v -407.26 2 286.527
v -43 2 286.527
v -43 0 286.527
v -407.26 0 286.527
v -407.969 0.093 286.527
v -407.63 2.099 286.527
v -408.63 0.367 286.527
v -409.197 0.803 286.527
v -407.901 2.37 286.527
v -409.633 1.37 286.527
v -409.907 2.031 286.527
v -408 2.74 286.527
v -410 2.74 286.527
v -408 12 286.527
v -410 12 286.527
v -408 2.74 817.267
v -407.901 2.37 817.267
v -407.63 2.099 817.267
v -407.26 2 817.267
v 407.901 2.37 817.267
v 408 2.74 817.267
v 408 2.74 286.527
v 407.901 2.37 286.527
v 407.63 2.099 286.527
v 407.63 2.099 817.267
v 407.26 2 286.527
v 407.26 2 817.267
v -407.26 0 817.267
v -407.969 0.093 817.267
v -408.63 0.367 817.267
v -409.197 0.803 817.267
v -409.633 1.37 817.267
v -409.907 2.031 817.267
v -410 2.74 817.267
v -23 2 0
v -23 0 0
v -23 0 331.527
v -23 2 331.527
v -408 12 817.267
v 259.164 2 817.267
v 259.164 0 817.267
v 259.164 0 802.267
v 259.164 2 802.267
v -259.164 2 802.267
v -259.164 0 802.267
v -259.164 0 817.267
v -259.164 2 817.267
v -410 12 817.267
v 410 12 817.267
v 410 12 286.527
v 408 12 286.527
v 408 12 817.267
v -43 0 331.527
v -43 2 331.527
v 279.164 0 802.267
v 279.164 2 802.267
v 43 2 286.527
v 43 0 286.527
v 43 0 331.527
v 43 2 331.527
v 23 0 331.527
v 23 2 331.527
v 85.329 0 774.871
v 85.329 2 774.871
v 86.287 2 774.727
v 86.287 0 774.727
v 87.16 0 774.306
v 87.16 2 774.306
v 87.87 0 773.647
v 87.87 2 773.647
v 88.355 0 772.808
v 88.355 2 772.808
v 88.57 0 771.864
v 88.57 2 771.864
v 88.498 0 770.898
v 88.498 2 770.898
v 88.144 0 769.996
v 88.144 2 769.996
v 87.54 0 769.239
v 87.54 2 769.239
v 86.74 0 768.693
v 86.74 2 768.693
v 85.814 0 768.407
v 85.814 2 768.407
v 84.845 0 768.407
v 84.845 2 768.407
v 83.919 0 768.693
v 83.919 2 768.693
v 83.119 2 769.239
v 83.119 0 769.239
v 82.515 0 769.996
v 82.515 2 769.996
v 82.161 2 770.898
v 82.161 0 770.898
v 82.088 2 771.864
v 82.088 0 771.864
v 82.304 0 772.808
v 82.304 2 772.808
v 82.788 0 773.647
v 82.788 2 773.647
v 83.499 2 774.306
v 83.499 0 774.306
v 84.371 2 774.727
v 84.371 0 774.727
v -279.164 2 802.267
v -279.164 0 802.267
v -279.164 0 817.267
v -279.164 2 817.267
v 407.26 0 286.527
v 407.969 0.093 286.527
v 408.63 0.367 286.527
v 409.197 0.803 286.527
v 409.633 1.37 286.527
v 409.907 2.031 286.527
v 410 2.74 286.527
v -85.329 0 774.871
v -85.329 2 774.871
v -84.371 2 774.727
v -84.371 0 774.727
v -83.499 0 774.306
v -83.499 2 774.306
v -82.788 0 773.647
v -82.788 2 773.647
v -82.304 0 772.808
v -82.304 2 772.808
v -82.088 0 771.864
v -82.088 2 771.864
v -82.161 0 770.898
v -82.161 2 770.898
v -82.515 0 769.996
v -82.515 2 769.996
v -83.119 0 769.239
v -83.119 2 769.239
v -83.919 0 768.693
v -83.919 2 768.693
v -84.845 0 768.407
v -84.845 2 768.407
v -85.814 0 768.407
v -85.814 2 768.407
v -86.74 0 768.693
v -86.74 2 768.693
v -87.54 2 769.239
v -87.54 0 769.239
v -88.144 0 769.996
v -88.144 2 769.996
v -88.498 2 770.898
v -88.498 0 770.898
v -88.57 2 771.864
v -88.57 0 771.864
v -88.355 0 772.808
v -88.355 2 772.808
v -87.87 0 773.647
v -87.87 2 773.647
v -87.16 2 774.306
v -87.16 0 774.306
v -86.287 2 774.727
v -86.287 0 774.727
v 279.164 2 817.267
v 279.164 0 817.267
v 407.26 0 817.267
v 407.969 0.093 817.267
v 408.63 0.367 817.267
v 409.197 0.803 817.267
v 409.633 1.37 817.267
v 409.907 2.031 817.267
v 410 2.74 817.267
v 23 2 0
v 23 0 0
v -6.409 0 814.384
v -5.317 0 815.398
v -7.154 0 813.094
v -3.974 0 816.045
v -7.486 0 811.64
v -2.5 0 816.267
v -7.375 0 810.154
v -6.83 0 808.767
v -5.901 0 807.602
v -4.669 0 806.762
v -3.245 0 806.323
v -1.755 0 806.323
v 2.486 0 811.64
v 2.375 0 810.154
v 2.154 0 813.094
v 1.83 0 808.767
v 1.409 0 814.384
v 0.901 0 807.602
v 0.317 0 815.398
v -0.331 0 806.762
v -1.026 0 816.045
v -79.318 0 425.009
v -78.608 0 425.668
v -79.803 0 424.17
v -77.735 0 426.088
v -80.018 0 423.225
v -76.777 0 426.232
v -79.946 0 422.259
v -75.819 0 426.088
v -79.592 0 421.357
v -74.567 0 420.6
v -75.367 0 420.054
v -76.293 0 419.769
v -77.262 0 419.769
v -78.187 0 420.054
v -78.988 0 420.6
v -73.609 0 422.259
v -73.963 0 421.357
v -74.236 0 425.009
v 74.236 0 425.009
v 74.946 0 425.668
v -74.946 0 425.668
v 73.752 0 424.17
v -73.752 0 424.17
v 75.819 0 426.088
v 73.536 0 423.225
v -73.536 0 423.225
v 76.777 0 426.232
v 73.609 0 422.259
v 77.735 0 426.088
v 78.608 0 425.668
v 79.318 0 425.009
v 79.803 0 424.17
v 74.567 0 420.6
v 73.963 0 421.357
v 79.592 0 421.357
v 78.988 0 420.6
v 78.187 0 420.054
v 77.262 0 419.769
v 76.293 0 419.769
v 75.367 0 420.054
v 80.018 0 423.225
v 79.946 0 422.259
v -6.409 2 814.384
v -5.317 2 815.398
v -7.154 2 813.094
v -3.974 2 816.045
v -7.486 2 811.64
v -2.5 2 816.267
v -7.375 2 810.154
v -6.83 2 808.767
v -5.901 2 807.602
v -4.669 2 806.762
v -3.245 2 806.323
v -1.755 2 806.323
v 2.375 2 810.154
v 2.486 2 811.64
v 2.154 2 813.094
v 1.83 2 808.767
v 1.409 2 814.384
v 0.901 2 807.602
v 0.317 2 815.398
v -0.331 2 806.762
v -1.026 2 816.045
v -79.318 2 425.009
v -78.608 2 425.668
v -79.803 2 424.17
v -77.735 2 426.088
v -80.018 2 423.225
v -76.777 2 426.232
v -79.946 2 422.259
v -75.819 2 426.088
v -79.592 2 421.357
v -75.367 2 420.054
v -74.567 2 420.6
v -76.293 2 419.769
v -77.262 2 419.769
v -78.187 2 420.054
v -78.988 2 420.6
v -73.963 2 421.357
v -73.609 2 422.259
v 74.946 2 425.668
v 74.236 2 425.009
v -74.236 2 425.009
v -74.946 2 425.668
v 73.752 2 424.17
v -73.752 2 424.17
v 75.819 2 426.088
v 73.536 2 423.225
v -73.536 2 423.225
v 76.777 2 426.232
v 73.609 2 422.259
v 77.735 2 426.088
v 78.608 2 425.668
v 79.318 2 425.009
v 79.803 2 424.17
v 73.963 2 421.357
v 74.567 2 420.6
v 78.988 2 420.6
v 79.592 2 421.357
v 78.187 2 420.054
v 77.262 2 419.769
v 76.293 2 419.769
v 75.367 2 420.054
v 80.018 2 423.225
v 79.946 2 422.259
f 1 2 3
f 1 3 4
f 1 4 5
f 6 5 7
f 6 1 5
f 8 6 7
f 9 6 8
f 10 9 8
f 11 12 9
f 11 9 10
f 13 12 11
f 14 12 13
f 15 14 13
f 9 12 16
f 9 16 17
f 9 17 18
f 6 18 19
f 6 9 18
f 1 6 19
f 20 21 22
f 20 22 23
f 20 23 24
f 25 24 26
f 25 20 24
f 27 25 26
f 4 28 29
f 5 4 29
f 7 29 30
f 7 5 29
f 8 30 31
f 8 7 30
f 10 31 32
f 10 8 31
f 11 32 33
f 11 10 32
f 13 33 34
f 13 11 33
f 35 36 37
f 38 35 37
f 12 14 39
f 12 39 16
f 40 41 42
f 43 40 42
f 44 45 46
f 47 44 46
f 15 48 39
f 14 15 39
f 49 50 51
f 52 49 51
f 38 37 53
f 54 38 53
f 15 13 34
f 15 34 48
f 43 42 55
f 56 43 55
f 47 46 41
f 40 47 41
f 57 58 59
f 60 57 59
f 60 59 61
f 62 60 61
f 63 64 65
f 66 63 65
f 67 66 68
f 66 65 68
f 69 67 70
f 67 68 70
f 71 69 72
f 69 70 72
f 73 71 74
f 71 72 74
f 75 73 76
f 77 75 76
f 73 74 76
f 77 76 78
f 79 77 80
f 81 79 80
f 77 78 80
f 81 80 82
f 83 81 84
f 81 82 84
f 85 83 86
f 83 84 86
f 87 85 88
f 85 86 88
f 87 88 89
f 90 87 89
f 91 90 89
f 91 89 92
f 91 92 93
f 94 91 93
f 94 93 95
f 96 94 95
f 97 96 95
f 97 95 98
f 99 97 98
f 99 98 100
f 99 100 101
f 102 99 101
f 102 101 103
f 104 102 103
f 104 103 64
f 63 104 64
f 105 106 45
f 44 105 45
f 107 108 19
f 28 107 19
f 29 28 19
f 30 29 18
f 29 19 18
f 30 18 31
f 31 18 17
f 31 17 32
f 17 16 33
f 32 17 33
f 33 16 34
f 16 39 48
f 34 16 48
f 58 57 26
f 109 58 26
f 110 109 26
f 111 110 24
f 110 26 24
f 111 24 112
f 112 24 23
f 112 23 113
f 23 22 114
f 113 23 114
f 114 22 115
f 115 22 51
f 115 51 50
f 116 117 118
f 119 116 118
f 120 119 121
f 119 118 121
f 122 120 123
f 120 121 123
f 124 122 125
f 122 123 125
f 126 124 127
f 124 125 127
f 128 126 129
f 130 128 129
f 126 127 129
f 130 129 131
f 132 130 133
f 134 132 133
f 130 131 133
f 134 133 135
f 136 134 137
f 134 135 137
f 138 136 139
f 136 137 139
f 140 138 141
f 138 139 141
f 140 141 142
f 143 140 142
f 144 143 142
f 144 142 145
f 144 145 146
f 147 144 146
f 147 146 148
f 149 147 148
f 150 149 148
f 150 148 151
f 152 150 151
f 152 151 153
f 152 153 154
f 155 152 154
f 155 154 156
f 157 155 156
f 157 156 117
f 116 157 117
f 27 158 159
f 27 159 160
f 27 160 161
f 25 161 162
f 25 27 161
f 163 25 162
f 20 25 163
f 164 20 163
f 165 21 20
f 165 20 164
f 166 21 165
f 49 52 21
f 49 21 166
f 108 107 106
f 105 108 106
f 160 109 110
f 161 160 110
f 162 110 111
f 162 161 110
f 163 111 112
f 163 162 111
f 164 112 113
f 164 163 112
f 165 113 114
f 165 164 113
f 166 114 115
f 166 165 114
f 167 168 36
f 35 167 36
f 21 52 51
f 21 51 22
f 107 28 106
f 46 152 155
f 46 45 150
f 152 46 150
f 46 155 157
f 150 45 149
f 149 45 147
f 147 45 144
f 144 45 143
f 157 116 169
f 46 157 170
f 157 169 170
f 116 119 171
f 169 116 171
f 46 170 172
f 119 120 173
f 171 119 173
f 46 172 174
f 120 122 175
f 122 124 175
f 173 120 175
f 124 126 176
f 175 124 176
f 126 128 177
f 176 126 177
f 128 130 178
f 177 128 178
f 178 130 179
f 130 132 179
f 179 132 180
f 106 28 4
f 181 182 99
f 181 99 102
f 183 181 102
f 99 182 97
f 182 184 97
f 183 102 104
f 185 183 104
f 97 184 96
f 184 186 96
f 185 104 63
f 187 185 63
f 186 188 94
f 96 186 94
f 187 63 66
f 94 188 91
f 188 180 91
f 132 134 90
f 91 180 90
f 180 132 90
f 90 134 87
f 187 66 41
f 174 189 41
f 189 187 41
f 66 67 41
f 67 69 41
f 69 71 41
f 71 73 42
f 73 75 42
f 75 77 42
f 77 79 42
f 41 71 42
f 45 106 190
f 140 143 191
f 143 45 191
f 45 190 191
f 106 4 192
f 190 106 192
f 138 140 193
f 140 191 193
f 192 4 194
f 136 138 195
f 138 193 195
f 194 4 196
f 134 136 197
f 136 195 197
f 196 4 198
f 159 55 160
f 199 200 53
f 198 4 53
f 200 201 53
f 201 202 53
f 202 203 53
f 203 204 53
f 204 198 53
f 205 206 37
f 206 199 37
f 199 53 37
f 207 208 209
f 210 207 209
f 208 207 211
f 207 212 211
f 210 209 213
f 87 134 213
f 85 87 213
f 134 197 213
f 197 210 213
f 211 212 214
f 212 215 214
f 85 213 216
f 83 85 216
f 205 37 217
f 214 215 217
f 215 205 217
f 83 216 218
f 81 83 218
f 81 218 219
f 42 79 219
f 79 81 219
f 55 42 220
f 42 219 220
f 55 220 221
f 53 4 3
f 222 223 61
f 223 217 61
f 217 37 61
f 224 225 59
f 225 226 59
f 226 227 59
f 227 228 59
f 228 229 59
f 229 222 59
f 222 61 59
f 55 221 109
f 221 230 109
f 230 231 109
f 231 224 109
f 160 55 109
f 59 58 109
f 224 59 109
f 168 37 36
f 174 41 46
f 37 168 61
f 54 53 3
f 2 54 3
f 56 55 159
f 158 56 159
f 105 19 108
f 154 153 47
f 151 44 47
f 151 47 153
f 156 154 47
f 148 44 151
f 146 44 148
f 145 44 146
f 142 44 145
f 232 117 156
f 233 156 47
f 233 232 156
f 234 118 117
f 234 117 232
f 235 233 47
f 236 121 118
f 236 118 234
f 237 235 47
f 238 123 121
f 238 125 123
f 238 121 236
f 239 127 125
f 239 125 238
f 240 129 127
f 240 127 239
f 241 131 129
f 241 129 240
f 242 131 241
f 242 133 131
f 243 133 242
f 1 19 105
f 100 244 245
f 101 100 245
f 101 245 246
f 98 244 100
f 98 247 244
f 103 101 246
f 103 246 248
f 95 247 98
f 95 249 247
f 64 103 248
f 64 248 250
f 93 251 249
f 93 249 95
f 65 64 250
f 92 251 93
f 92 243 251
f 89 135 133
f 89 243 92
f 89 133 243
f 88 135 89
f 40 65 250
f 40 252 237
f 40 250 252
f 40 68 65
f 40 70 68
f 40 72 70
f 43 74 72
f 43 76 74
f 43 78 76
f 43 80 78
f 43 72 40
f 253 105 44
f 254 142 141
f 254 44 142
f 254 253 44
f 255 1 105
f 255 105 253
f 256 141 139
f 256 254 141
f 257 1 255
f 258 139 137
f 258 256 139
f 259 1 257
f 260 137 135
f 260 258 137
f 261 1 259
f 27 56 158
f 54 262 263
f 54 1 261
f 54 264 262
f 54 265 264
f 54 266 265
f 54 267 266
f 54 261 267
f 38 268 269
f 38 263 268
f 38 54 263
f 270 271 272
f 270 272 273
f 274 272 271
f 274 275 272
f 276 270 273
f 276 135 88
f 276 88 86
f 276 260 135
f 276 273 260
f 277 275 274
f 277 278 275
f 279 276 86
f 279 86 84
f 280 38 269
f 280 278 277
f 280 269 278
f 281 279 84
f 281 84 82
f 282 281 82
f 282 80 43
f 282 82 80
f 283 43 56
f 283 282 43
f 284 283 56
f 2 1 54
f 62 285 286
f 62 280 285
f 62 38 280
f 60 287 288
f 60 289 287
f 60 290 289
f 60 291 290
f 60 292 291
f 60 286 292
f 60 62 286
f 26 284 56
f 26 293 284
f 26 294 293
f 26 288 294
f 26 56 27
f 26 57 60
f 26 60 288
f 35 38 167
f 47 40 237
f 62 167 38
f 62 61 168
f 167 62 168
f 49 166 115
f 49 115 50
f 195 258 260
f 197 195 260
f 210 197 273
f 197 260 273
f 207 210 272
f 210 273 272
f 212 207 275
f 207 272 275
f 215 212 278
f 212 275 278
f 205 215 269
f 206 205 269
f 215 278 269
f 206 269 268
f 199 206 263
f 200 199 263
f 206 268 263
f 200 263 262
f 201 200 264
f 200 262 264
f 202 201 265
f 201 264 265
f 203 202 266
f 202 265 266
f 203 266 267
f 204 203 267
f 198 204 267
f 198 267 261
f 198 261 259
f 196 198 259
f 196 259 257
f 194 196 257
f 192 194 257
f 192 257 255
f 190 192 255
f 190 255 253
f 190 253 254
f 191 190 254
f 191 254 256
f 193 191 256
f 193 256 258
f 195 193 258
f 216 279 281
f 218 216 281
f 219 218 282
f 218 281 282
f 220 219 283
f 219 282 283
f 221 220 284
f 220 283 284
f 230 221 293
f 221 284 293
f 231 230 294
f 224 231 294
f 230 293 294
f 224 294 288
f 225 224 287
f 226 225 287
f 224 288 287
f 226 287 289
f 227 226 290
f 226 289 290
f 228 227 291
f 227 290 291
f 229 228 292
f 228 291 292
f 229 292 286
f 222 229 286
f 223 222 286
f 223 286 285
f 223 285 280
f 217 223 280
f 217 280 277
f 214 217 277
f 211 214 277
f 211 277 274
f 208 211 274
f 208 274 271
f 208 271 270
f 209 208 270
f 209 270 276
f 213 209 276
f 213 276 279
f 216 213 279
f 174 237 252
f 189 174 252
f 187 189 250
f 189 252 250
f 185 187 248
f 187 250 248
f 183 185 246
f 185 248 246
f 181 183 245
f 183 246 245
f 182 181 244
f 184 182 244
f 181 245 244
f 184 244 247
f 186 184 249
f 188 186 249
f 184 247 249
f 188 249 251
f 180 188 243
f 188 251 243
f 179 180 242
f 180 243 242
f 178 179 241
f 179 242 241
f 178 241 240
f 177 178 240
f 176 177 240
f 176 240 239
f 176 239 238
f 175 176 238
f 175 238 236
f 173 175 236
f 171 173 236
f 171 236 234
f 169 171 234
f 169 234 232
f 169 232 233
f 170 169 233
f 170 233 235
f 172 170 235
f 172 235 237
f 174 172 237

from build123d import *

# Parameters (mm, degrees)
SM_BASE_FLANGE_1_DEPTH             = 2
SM_EDGE_FLANGE_1_STRIP_W           = 9.48
SM_EDGE_FLANGE_1_STRIP_H           = 2
SM_EDGE_FLANGE_1_STRIP_CUT_DEPTH   = 530.740059044
SM_EDGE_FLANGE_1_STRIP_2_W         = 9.48
SM_EDGE_FLANGE_1_STRIP_2_H         = 2
SM_EDGE_FLANGE_1_STRIP_CUT_2_DEPTH = 530.740059044
SM_EDGE_FLANGE_1_DEPTH             = 530.740059044
SM_EDGE_FLANGE_1_BEND_DEPTH        = 530.740059044
SKETCH_12_R                        = 5
CUT_EXTRUDE_1_DEPTH                = 3
SKETCH_13_R                        = 3.25
CUT_EXTRUDE_2_DEPTH                = 5


# Read off the part's stored shape, not the designer's step: Базовая кромка1
# Sheet-metal steps are written as plain solids
with BuildPart() as part:
    # Базовая кромка1 outline → Базовая кромка1 (new body)
    with BuildSketch(Plane(origin=(0, 0, 0), x_dir=(1, 0, 0), z_dir=(0, 1, 0))):
        Polygon((-23, -331.526743508), (-43, -331.526743508), (-43, -286.526743508), (-410, -286.526743508), (-410, -817.266802552), (-279.163690552, -817.266802552), (-279.163690552, -802.266802552), (-259.163690552, -802.266802552), (-259.163690552, -817.266802552), (259.163690552, -817.266802552), (259.163690552, -802.266802552), (279.163690552, -802.266802552), (279.163690552, -817.266802552), (410, -817.266802552), (410, -286.526743508), (43, -286.526743508), (43, -331.526743508), (23, -331.526743508), (23, 0), (-23, 0), align=None)
    extrude(amount=SM_BASE_FLANGE_1_DEPTH)

    # Ребро-кромка1 strip (across the edge) → Ребро-кромка1 strip cut (cut)
    with BuildSketch(Plane(origin=(410, 2, 817.266802552), x_dir=(-1, 0, 0), z_dir=(0, 0, -1))):
        with Locations((-2, -1)):
            Rectangle(SM_EDGE_FLANGE_1_STRIP_W, SM_EDGE_FLANGE_1_STRIP_H)
    extrude(amount=SM_EDGE_FLANGE_1_STRIP_CUT_DEPTH, mode=Mode.SUBTRACT)

    # Ребро-кромка1 strip 2 (across the edge) → Ребро-кромка1 strip cut 2 (cut)
    with BuildSketch(Plane(origin=(-410, 2, 286.526743508), x_dir=(1, 0, 0), z_dir=(0, 0, 1))):
        with Locations((-2, -1)):
            Rectangle(SM_EDGE_FLANGE_1_STRIP_2_W, SM_EDGE_FLANGE_1_STRIP_2_H)
    extrude(amount=SM_EDGE_FLANGE_1_STRIP_CUT_2_DEPTH, mode=Mode.SUBTRACT)

    # Ребро-кромка1 section (across the edge) → Ребро-кромка1 (add)
    with BuildSketch(Plane(origin=(410, 2, 817.266802552), x_dir=(-1, 0, 0), z_dir=(0, 0, -1))):
        with BuildLine():
            Line((0, 0.74), (0, 10))
            Line((0, 10), (2, 10))
            Line((2, 10), (2, 0.74))
            ThreePointArc((2, 0.74), (2.216740982, 0.216740982), (2.74, 0))
            Line((2.74, 0), (2.74, -2))
            ThreePointArc((2.74, -2), (0.80252742, -1.19747258), (0, 0.74))
        make_face()
    extrude(amount=SM_EDGE_FLANGE_1_DEPTH)

    # Ребро-кромка1 section 2 (across the edge) → Ребро-кромка1 bend (add)
    with BuildSketch(Plane(origin=(-410, 2, 286.526743508), x_dir=(1, 0, 0), z_dir=(0, 0, 1))):
        with BuildLine():
            Line((0, 0.74), (0, 10))
            Line((0, 10), (2, 10))
            Line((2, 10), (2, 0.74))
            ThreePointArc((2, 0.74), (2.216740982, 0.216740982), (2.74, 0))
            Line((2.74, 0), (2.74, -2))
            ThreePointArc((2.74, -2), (0.80252742, -1.19747258), (0, 0.74))
        make_face()
    extrude(amount=SM_EDGE_FLANGE_1_BEND_DEPTH)

    # Эскиз12 → Вырез-Вытянуть1 (cut)
    with BuildSketch(Plane(origin=(0, 2, 0), x_dir=(1, 0, 0), z_dir=(0, 1, 0))):
        with Locations(Location((-2.5, -811.266802552, 0), (0, 0, 270))):
            Circle(SKETCH_12_R)
    extrude(amount=-CUT_EXTRUDE_1_DEPTH, mode=Mode.SUBTRACT)

    # Эскиз13 → Вырез-Вытянуть2 (cut)
    with BuildSketch(Plane(origin=(0, 2, 0), x_dir=(1, 0, 0), z_dir=(0, 1, 0))):
        with Locations(Location((76.777184185, -422.982246008, 0), (0, 0, 270))):
            Circle(SKETCH_13_R)
        with Locations(Location((85.329382087, -771.621076737, 0), (0, 0, 270))):
            Circle(SKETCH_13_R)
        with Locations(Location((-85.329382087, -771.621076737, 0), (0, 0, 270))):
            Circle(SKETCH_13_R)
        with Locations(Location((-76.777184185, -422.982246008, 0), (0, 0, 270))):
            Circle(SKETCH_13_R)
    extrude(amount=-CUT_EXTRUDE_2_DEPTH, mode=Mode.SUBTRACT)


solid = part.part
